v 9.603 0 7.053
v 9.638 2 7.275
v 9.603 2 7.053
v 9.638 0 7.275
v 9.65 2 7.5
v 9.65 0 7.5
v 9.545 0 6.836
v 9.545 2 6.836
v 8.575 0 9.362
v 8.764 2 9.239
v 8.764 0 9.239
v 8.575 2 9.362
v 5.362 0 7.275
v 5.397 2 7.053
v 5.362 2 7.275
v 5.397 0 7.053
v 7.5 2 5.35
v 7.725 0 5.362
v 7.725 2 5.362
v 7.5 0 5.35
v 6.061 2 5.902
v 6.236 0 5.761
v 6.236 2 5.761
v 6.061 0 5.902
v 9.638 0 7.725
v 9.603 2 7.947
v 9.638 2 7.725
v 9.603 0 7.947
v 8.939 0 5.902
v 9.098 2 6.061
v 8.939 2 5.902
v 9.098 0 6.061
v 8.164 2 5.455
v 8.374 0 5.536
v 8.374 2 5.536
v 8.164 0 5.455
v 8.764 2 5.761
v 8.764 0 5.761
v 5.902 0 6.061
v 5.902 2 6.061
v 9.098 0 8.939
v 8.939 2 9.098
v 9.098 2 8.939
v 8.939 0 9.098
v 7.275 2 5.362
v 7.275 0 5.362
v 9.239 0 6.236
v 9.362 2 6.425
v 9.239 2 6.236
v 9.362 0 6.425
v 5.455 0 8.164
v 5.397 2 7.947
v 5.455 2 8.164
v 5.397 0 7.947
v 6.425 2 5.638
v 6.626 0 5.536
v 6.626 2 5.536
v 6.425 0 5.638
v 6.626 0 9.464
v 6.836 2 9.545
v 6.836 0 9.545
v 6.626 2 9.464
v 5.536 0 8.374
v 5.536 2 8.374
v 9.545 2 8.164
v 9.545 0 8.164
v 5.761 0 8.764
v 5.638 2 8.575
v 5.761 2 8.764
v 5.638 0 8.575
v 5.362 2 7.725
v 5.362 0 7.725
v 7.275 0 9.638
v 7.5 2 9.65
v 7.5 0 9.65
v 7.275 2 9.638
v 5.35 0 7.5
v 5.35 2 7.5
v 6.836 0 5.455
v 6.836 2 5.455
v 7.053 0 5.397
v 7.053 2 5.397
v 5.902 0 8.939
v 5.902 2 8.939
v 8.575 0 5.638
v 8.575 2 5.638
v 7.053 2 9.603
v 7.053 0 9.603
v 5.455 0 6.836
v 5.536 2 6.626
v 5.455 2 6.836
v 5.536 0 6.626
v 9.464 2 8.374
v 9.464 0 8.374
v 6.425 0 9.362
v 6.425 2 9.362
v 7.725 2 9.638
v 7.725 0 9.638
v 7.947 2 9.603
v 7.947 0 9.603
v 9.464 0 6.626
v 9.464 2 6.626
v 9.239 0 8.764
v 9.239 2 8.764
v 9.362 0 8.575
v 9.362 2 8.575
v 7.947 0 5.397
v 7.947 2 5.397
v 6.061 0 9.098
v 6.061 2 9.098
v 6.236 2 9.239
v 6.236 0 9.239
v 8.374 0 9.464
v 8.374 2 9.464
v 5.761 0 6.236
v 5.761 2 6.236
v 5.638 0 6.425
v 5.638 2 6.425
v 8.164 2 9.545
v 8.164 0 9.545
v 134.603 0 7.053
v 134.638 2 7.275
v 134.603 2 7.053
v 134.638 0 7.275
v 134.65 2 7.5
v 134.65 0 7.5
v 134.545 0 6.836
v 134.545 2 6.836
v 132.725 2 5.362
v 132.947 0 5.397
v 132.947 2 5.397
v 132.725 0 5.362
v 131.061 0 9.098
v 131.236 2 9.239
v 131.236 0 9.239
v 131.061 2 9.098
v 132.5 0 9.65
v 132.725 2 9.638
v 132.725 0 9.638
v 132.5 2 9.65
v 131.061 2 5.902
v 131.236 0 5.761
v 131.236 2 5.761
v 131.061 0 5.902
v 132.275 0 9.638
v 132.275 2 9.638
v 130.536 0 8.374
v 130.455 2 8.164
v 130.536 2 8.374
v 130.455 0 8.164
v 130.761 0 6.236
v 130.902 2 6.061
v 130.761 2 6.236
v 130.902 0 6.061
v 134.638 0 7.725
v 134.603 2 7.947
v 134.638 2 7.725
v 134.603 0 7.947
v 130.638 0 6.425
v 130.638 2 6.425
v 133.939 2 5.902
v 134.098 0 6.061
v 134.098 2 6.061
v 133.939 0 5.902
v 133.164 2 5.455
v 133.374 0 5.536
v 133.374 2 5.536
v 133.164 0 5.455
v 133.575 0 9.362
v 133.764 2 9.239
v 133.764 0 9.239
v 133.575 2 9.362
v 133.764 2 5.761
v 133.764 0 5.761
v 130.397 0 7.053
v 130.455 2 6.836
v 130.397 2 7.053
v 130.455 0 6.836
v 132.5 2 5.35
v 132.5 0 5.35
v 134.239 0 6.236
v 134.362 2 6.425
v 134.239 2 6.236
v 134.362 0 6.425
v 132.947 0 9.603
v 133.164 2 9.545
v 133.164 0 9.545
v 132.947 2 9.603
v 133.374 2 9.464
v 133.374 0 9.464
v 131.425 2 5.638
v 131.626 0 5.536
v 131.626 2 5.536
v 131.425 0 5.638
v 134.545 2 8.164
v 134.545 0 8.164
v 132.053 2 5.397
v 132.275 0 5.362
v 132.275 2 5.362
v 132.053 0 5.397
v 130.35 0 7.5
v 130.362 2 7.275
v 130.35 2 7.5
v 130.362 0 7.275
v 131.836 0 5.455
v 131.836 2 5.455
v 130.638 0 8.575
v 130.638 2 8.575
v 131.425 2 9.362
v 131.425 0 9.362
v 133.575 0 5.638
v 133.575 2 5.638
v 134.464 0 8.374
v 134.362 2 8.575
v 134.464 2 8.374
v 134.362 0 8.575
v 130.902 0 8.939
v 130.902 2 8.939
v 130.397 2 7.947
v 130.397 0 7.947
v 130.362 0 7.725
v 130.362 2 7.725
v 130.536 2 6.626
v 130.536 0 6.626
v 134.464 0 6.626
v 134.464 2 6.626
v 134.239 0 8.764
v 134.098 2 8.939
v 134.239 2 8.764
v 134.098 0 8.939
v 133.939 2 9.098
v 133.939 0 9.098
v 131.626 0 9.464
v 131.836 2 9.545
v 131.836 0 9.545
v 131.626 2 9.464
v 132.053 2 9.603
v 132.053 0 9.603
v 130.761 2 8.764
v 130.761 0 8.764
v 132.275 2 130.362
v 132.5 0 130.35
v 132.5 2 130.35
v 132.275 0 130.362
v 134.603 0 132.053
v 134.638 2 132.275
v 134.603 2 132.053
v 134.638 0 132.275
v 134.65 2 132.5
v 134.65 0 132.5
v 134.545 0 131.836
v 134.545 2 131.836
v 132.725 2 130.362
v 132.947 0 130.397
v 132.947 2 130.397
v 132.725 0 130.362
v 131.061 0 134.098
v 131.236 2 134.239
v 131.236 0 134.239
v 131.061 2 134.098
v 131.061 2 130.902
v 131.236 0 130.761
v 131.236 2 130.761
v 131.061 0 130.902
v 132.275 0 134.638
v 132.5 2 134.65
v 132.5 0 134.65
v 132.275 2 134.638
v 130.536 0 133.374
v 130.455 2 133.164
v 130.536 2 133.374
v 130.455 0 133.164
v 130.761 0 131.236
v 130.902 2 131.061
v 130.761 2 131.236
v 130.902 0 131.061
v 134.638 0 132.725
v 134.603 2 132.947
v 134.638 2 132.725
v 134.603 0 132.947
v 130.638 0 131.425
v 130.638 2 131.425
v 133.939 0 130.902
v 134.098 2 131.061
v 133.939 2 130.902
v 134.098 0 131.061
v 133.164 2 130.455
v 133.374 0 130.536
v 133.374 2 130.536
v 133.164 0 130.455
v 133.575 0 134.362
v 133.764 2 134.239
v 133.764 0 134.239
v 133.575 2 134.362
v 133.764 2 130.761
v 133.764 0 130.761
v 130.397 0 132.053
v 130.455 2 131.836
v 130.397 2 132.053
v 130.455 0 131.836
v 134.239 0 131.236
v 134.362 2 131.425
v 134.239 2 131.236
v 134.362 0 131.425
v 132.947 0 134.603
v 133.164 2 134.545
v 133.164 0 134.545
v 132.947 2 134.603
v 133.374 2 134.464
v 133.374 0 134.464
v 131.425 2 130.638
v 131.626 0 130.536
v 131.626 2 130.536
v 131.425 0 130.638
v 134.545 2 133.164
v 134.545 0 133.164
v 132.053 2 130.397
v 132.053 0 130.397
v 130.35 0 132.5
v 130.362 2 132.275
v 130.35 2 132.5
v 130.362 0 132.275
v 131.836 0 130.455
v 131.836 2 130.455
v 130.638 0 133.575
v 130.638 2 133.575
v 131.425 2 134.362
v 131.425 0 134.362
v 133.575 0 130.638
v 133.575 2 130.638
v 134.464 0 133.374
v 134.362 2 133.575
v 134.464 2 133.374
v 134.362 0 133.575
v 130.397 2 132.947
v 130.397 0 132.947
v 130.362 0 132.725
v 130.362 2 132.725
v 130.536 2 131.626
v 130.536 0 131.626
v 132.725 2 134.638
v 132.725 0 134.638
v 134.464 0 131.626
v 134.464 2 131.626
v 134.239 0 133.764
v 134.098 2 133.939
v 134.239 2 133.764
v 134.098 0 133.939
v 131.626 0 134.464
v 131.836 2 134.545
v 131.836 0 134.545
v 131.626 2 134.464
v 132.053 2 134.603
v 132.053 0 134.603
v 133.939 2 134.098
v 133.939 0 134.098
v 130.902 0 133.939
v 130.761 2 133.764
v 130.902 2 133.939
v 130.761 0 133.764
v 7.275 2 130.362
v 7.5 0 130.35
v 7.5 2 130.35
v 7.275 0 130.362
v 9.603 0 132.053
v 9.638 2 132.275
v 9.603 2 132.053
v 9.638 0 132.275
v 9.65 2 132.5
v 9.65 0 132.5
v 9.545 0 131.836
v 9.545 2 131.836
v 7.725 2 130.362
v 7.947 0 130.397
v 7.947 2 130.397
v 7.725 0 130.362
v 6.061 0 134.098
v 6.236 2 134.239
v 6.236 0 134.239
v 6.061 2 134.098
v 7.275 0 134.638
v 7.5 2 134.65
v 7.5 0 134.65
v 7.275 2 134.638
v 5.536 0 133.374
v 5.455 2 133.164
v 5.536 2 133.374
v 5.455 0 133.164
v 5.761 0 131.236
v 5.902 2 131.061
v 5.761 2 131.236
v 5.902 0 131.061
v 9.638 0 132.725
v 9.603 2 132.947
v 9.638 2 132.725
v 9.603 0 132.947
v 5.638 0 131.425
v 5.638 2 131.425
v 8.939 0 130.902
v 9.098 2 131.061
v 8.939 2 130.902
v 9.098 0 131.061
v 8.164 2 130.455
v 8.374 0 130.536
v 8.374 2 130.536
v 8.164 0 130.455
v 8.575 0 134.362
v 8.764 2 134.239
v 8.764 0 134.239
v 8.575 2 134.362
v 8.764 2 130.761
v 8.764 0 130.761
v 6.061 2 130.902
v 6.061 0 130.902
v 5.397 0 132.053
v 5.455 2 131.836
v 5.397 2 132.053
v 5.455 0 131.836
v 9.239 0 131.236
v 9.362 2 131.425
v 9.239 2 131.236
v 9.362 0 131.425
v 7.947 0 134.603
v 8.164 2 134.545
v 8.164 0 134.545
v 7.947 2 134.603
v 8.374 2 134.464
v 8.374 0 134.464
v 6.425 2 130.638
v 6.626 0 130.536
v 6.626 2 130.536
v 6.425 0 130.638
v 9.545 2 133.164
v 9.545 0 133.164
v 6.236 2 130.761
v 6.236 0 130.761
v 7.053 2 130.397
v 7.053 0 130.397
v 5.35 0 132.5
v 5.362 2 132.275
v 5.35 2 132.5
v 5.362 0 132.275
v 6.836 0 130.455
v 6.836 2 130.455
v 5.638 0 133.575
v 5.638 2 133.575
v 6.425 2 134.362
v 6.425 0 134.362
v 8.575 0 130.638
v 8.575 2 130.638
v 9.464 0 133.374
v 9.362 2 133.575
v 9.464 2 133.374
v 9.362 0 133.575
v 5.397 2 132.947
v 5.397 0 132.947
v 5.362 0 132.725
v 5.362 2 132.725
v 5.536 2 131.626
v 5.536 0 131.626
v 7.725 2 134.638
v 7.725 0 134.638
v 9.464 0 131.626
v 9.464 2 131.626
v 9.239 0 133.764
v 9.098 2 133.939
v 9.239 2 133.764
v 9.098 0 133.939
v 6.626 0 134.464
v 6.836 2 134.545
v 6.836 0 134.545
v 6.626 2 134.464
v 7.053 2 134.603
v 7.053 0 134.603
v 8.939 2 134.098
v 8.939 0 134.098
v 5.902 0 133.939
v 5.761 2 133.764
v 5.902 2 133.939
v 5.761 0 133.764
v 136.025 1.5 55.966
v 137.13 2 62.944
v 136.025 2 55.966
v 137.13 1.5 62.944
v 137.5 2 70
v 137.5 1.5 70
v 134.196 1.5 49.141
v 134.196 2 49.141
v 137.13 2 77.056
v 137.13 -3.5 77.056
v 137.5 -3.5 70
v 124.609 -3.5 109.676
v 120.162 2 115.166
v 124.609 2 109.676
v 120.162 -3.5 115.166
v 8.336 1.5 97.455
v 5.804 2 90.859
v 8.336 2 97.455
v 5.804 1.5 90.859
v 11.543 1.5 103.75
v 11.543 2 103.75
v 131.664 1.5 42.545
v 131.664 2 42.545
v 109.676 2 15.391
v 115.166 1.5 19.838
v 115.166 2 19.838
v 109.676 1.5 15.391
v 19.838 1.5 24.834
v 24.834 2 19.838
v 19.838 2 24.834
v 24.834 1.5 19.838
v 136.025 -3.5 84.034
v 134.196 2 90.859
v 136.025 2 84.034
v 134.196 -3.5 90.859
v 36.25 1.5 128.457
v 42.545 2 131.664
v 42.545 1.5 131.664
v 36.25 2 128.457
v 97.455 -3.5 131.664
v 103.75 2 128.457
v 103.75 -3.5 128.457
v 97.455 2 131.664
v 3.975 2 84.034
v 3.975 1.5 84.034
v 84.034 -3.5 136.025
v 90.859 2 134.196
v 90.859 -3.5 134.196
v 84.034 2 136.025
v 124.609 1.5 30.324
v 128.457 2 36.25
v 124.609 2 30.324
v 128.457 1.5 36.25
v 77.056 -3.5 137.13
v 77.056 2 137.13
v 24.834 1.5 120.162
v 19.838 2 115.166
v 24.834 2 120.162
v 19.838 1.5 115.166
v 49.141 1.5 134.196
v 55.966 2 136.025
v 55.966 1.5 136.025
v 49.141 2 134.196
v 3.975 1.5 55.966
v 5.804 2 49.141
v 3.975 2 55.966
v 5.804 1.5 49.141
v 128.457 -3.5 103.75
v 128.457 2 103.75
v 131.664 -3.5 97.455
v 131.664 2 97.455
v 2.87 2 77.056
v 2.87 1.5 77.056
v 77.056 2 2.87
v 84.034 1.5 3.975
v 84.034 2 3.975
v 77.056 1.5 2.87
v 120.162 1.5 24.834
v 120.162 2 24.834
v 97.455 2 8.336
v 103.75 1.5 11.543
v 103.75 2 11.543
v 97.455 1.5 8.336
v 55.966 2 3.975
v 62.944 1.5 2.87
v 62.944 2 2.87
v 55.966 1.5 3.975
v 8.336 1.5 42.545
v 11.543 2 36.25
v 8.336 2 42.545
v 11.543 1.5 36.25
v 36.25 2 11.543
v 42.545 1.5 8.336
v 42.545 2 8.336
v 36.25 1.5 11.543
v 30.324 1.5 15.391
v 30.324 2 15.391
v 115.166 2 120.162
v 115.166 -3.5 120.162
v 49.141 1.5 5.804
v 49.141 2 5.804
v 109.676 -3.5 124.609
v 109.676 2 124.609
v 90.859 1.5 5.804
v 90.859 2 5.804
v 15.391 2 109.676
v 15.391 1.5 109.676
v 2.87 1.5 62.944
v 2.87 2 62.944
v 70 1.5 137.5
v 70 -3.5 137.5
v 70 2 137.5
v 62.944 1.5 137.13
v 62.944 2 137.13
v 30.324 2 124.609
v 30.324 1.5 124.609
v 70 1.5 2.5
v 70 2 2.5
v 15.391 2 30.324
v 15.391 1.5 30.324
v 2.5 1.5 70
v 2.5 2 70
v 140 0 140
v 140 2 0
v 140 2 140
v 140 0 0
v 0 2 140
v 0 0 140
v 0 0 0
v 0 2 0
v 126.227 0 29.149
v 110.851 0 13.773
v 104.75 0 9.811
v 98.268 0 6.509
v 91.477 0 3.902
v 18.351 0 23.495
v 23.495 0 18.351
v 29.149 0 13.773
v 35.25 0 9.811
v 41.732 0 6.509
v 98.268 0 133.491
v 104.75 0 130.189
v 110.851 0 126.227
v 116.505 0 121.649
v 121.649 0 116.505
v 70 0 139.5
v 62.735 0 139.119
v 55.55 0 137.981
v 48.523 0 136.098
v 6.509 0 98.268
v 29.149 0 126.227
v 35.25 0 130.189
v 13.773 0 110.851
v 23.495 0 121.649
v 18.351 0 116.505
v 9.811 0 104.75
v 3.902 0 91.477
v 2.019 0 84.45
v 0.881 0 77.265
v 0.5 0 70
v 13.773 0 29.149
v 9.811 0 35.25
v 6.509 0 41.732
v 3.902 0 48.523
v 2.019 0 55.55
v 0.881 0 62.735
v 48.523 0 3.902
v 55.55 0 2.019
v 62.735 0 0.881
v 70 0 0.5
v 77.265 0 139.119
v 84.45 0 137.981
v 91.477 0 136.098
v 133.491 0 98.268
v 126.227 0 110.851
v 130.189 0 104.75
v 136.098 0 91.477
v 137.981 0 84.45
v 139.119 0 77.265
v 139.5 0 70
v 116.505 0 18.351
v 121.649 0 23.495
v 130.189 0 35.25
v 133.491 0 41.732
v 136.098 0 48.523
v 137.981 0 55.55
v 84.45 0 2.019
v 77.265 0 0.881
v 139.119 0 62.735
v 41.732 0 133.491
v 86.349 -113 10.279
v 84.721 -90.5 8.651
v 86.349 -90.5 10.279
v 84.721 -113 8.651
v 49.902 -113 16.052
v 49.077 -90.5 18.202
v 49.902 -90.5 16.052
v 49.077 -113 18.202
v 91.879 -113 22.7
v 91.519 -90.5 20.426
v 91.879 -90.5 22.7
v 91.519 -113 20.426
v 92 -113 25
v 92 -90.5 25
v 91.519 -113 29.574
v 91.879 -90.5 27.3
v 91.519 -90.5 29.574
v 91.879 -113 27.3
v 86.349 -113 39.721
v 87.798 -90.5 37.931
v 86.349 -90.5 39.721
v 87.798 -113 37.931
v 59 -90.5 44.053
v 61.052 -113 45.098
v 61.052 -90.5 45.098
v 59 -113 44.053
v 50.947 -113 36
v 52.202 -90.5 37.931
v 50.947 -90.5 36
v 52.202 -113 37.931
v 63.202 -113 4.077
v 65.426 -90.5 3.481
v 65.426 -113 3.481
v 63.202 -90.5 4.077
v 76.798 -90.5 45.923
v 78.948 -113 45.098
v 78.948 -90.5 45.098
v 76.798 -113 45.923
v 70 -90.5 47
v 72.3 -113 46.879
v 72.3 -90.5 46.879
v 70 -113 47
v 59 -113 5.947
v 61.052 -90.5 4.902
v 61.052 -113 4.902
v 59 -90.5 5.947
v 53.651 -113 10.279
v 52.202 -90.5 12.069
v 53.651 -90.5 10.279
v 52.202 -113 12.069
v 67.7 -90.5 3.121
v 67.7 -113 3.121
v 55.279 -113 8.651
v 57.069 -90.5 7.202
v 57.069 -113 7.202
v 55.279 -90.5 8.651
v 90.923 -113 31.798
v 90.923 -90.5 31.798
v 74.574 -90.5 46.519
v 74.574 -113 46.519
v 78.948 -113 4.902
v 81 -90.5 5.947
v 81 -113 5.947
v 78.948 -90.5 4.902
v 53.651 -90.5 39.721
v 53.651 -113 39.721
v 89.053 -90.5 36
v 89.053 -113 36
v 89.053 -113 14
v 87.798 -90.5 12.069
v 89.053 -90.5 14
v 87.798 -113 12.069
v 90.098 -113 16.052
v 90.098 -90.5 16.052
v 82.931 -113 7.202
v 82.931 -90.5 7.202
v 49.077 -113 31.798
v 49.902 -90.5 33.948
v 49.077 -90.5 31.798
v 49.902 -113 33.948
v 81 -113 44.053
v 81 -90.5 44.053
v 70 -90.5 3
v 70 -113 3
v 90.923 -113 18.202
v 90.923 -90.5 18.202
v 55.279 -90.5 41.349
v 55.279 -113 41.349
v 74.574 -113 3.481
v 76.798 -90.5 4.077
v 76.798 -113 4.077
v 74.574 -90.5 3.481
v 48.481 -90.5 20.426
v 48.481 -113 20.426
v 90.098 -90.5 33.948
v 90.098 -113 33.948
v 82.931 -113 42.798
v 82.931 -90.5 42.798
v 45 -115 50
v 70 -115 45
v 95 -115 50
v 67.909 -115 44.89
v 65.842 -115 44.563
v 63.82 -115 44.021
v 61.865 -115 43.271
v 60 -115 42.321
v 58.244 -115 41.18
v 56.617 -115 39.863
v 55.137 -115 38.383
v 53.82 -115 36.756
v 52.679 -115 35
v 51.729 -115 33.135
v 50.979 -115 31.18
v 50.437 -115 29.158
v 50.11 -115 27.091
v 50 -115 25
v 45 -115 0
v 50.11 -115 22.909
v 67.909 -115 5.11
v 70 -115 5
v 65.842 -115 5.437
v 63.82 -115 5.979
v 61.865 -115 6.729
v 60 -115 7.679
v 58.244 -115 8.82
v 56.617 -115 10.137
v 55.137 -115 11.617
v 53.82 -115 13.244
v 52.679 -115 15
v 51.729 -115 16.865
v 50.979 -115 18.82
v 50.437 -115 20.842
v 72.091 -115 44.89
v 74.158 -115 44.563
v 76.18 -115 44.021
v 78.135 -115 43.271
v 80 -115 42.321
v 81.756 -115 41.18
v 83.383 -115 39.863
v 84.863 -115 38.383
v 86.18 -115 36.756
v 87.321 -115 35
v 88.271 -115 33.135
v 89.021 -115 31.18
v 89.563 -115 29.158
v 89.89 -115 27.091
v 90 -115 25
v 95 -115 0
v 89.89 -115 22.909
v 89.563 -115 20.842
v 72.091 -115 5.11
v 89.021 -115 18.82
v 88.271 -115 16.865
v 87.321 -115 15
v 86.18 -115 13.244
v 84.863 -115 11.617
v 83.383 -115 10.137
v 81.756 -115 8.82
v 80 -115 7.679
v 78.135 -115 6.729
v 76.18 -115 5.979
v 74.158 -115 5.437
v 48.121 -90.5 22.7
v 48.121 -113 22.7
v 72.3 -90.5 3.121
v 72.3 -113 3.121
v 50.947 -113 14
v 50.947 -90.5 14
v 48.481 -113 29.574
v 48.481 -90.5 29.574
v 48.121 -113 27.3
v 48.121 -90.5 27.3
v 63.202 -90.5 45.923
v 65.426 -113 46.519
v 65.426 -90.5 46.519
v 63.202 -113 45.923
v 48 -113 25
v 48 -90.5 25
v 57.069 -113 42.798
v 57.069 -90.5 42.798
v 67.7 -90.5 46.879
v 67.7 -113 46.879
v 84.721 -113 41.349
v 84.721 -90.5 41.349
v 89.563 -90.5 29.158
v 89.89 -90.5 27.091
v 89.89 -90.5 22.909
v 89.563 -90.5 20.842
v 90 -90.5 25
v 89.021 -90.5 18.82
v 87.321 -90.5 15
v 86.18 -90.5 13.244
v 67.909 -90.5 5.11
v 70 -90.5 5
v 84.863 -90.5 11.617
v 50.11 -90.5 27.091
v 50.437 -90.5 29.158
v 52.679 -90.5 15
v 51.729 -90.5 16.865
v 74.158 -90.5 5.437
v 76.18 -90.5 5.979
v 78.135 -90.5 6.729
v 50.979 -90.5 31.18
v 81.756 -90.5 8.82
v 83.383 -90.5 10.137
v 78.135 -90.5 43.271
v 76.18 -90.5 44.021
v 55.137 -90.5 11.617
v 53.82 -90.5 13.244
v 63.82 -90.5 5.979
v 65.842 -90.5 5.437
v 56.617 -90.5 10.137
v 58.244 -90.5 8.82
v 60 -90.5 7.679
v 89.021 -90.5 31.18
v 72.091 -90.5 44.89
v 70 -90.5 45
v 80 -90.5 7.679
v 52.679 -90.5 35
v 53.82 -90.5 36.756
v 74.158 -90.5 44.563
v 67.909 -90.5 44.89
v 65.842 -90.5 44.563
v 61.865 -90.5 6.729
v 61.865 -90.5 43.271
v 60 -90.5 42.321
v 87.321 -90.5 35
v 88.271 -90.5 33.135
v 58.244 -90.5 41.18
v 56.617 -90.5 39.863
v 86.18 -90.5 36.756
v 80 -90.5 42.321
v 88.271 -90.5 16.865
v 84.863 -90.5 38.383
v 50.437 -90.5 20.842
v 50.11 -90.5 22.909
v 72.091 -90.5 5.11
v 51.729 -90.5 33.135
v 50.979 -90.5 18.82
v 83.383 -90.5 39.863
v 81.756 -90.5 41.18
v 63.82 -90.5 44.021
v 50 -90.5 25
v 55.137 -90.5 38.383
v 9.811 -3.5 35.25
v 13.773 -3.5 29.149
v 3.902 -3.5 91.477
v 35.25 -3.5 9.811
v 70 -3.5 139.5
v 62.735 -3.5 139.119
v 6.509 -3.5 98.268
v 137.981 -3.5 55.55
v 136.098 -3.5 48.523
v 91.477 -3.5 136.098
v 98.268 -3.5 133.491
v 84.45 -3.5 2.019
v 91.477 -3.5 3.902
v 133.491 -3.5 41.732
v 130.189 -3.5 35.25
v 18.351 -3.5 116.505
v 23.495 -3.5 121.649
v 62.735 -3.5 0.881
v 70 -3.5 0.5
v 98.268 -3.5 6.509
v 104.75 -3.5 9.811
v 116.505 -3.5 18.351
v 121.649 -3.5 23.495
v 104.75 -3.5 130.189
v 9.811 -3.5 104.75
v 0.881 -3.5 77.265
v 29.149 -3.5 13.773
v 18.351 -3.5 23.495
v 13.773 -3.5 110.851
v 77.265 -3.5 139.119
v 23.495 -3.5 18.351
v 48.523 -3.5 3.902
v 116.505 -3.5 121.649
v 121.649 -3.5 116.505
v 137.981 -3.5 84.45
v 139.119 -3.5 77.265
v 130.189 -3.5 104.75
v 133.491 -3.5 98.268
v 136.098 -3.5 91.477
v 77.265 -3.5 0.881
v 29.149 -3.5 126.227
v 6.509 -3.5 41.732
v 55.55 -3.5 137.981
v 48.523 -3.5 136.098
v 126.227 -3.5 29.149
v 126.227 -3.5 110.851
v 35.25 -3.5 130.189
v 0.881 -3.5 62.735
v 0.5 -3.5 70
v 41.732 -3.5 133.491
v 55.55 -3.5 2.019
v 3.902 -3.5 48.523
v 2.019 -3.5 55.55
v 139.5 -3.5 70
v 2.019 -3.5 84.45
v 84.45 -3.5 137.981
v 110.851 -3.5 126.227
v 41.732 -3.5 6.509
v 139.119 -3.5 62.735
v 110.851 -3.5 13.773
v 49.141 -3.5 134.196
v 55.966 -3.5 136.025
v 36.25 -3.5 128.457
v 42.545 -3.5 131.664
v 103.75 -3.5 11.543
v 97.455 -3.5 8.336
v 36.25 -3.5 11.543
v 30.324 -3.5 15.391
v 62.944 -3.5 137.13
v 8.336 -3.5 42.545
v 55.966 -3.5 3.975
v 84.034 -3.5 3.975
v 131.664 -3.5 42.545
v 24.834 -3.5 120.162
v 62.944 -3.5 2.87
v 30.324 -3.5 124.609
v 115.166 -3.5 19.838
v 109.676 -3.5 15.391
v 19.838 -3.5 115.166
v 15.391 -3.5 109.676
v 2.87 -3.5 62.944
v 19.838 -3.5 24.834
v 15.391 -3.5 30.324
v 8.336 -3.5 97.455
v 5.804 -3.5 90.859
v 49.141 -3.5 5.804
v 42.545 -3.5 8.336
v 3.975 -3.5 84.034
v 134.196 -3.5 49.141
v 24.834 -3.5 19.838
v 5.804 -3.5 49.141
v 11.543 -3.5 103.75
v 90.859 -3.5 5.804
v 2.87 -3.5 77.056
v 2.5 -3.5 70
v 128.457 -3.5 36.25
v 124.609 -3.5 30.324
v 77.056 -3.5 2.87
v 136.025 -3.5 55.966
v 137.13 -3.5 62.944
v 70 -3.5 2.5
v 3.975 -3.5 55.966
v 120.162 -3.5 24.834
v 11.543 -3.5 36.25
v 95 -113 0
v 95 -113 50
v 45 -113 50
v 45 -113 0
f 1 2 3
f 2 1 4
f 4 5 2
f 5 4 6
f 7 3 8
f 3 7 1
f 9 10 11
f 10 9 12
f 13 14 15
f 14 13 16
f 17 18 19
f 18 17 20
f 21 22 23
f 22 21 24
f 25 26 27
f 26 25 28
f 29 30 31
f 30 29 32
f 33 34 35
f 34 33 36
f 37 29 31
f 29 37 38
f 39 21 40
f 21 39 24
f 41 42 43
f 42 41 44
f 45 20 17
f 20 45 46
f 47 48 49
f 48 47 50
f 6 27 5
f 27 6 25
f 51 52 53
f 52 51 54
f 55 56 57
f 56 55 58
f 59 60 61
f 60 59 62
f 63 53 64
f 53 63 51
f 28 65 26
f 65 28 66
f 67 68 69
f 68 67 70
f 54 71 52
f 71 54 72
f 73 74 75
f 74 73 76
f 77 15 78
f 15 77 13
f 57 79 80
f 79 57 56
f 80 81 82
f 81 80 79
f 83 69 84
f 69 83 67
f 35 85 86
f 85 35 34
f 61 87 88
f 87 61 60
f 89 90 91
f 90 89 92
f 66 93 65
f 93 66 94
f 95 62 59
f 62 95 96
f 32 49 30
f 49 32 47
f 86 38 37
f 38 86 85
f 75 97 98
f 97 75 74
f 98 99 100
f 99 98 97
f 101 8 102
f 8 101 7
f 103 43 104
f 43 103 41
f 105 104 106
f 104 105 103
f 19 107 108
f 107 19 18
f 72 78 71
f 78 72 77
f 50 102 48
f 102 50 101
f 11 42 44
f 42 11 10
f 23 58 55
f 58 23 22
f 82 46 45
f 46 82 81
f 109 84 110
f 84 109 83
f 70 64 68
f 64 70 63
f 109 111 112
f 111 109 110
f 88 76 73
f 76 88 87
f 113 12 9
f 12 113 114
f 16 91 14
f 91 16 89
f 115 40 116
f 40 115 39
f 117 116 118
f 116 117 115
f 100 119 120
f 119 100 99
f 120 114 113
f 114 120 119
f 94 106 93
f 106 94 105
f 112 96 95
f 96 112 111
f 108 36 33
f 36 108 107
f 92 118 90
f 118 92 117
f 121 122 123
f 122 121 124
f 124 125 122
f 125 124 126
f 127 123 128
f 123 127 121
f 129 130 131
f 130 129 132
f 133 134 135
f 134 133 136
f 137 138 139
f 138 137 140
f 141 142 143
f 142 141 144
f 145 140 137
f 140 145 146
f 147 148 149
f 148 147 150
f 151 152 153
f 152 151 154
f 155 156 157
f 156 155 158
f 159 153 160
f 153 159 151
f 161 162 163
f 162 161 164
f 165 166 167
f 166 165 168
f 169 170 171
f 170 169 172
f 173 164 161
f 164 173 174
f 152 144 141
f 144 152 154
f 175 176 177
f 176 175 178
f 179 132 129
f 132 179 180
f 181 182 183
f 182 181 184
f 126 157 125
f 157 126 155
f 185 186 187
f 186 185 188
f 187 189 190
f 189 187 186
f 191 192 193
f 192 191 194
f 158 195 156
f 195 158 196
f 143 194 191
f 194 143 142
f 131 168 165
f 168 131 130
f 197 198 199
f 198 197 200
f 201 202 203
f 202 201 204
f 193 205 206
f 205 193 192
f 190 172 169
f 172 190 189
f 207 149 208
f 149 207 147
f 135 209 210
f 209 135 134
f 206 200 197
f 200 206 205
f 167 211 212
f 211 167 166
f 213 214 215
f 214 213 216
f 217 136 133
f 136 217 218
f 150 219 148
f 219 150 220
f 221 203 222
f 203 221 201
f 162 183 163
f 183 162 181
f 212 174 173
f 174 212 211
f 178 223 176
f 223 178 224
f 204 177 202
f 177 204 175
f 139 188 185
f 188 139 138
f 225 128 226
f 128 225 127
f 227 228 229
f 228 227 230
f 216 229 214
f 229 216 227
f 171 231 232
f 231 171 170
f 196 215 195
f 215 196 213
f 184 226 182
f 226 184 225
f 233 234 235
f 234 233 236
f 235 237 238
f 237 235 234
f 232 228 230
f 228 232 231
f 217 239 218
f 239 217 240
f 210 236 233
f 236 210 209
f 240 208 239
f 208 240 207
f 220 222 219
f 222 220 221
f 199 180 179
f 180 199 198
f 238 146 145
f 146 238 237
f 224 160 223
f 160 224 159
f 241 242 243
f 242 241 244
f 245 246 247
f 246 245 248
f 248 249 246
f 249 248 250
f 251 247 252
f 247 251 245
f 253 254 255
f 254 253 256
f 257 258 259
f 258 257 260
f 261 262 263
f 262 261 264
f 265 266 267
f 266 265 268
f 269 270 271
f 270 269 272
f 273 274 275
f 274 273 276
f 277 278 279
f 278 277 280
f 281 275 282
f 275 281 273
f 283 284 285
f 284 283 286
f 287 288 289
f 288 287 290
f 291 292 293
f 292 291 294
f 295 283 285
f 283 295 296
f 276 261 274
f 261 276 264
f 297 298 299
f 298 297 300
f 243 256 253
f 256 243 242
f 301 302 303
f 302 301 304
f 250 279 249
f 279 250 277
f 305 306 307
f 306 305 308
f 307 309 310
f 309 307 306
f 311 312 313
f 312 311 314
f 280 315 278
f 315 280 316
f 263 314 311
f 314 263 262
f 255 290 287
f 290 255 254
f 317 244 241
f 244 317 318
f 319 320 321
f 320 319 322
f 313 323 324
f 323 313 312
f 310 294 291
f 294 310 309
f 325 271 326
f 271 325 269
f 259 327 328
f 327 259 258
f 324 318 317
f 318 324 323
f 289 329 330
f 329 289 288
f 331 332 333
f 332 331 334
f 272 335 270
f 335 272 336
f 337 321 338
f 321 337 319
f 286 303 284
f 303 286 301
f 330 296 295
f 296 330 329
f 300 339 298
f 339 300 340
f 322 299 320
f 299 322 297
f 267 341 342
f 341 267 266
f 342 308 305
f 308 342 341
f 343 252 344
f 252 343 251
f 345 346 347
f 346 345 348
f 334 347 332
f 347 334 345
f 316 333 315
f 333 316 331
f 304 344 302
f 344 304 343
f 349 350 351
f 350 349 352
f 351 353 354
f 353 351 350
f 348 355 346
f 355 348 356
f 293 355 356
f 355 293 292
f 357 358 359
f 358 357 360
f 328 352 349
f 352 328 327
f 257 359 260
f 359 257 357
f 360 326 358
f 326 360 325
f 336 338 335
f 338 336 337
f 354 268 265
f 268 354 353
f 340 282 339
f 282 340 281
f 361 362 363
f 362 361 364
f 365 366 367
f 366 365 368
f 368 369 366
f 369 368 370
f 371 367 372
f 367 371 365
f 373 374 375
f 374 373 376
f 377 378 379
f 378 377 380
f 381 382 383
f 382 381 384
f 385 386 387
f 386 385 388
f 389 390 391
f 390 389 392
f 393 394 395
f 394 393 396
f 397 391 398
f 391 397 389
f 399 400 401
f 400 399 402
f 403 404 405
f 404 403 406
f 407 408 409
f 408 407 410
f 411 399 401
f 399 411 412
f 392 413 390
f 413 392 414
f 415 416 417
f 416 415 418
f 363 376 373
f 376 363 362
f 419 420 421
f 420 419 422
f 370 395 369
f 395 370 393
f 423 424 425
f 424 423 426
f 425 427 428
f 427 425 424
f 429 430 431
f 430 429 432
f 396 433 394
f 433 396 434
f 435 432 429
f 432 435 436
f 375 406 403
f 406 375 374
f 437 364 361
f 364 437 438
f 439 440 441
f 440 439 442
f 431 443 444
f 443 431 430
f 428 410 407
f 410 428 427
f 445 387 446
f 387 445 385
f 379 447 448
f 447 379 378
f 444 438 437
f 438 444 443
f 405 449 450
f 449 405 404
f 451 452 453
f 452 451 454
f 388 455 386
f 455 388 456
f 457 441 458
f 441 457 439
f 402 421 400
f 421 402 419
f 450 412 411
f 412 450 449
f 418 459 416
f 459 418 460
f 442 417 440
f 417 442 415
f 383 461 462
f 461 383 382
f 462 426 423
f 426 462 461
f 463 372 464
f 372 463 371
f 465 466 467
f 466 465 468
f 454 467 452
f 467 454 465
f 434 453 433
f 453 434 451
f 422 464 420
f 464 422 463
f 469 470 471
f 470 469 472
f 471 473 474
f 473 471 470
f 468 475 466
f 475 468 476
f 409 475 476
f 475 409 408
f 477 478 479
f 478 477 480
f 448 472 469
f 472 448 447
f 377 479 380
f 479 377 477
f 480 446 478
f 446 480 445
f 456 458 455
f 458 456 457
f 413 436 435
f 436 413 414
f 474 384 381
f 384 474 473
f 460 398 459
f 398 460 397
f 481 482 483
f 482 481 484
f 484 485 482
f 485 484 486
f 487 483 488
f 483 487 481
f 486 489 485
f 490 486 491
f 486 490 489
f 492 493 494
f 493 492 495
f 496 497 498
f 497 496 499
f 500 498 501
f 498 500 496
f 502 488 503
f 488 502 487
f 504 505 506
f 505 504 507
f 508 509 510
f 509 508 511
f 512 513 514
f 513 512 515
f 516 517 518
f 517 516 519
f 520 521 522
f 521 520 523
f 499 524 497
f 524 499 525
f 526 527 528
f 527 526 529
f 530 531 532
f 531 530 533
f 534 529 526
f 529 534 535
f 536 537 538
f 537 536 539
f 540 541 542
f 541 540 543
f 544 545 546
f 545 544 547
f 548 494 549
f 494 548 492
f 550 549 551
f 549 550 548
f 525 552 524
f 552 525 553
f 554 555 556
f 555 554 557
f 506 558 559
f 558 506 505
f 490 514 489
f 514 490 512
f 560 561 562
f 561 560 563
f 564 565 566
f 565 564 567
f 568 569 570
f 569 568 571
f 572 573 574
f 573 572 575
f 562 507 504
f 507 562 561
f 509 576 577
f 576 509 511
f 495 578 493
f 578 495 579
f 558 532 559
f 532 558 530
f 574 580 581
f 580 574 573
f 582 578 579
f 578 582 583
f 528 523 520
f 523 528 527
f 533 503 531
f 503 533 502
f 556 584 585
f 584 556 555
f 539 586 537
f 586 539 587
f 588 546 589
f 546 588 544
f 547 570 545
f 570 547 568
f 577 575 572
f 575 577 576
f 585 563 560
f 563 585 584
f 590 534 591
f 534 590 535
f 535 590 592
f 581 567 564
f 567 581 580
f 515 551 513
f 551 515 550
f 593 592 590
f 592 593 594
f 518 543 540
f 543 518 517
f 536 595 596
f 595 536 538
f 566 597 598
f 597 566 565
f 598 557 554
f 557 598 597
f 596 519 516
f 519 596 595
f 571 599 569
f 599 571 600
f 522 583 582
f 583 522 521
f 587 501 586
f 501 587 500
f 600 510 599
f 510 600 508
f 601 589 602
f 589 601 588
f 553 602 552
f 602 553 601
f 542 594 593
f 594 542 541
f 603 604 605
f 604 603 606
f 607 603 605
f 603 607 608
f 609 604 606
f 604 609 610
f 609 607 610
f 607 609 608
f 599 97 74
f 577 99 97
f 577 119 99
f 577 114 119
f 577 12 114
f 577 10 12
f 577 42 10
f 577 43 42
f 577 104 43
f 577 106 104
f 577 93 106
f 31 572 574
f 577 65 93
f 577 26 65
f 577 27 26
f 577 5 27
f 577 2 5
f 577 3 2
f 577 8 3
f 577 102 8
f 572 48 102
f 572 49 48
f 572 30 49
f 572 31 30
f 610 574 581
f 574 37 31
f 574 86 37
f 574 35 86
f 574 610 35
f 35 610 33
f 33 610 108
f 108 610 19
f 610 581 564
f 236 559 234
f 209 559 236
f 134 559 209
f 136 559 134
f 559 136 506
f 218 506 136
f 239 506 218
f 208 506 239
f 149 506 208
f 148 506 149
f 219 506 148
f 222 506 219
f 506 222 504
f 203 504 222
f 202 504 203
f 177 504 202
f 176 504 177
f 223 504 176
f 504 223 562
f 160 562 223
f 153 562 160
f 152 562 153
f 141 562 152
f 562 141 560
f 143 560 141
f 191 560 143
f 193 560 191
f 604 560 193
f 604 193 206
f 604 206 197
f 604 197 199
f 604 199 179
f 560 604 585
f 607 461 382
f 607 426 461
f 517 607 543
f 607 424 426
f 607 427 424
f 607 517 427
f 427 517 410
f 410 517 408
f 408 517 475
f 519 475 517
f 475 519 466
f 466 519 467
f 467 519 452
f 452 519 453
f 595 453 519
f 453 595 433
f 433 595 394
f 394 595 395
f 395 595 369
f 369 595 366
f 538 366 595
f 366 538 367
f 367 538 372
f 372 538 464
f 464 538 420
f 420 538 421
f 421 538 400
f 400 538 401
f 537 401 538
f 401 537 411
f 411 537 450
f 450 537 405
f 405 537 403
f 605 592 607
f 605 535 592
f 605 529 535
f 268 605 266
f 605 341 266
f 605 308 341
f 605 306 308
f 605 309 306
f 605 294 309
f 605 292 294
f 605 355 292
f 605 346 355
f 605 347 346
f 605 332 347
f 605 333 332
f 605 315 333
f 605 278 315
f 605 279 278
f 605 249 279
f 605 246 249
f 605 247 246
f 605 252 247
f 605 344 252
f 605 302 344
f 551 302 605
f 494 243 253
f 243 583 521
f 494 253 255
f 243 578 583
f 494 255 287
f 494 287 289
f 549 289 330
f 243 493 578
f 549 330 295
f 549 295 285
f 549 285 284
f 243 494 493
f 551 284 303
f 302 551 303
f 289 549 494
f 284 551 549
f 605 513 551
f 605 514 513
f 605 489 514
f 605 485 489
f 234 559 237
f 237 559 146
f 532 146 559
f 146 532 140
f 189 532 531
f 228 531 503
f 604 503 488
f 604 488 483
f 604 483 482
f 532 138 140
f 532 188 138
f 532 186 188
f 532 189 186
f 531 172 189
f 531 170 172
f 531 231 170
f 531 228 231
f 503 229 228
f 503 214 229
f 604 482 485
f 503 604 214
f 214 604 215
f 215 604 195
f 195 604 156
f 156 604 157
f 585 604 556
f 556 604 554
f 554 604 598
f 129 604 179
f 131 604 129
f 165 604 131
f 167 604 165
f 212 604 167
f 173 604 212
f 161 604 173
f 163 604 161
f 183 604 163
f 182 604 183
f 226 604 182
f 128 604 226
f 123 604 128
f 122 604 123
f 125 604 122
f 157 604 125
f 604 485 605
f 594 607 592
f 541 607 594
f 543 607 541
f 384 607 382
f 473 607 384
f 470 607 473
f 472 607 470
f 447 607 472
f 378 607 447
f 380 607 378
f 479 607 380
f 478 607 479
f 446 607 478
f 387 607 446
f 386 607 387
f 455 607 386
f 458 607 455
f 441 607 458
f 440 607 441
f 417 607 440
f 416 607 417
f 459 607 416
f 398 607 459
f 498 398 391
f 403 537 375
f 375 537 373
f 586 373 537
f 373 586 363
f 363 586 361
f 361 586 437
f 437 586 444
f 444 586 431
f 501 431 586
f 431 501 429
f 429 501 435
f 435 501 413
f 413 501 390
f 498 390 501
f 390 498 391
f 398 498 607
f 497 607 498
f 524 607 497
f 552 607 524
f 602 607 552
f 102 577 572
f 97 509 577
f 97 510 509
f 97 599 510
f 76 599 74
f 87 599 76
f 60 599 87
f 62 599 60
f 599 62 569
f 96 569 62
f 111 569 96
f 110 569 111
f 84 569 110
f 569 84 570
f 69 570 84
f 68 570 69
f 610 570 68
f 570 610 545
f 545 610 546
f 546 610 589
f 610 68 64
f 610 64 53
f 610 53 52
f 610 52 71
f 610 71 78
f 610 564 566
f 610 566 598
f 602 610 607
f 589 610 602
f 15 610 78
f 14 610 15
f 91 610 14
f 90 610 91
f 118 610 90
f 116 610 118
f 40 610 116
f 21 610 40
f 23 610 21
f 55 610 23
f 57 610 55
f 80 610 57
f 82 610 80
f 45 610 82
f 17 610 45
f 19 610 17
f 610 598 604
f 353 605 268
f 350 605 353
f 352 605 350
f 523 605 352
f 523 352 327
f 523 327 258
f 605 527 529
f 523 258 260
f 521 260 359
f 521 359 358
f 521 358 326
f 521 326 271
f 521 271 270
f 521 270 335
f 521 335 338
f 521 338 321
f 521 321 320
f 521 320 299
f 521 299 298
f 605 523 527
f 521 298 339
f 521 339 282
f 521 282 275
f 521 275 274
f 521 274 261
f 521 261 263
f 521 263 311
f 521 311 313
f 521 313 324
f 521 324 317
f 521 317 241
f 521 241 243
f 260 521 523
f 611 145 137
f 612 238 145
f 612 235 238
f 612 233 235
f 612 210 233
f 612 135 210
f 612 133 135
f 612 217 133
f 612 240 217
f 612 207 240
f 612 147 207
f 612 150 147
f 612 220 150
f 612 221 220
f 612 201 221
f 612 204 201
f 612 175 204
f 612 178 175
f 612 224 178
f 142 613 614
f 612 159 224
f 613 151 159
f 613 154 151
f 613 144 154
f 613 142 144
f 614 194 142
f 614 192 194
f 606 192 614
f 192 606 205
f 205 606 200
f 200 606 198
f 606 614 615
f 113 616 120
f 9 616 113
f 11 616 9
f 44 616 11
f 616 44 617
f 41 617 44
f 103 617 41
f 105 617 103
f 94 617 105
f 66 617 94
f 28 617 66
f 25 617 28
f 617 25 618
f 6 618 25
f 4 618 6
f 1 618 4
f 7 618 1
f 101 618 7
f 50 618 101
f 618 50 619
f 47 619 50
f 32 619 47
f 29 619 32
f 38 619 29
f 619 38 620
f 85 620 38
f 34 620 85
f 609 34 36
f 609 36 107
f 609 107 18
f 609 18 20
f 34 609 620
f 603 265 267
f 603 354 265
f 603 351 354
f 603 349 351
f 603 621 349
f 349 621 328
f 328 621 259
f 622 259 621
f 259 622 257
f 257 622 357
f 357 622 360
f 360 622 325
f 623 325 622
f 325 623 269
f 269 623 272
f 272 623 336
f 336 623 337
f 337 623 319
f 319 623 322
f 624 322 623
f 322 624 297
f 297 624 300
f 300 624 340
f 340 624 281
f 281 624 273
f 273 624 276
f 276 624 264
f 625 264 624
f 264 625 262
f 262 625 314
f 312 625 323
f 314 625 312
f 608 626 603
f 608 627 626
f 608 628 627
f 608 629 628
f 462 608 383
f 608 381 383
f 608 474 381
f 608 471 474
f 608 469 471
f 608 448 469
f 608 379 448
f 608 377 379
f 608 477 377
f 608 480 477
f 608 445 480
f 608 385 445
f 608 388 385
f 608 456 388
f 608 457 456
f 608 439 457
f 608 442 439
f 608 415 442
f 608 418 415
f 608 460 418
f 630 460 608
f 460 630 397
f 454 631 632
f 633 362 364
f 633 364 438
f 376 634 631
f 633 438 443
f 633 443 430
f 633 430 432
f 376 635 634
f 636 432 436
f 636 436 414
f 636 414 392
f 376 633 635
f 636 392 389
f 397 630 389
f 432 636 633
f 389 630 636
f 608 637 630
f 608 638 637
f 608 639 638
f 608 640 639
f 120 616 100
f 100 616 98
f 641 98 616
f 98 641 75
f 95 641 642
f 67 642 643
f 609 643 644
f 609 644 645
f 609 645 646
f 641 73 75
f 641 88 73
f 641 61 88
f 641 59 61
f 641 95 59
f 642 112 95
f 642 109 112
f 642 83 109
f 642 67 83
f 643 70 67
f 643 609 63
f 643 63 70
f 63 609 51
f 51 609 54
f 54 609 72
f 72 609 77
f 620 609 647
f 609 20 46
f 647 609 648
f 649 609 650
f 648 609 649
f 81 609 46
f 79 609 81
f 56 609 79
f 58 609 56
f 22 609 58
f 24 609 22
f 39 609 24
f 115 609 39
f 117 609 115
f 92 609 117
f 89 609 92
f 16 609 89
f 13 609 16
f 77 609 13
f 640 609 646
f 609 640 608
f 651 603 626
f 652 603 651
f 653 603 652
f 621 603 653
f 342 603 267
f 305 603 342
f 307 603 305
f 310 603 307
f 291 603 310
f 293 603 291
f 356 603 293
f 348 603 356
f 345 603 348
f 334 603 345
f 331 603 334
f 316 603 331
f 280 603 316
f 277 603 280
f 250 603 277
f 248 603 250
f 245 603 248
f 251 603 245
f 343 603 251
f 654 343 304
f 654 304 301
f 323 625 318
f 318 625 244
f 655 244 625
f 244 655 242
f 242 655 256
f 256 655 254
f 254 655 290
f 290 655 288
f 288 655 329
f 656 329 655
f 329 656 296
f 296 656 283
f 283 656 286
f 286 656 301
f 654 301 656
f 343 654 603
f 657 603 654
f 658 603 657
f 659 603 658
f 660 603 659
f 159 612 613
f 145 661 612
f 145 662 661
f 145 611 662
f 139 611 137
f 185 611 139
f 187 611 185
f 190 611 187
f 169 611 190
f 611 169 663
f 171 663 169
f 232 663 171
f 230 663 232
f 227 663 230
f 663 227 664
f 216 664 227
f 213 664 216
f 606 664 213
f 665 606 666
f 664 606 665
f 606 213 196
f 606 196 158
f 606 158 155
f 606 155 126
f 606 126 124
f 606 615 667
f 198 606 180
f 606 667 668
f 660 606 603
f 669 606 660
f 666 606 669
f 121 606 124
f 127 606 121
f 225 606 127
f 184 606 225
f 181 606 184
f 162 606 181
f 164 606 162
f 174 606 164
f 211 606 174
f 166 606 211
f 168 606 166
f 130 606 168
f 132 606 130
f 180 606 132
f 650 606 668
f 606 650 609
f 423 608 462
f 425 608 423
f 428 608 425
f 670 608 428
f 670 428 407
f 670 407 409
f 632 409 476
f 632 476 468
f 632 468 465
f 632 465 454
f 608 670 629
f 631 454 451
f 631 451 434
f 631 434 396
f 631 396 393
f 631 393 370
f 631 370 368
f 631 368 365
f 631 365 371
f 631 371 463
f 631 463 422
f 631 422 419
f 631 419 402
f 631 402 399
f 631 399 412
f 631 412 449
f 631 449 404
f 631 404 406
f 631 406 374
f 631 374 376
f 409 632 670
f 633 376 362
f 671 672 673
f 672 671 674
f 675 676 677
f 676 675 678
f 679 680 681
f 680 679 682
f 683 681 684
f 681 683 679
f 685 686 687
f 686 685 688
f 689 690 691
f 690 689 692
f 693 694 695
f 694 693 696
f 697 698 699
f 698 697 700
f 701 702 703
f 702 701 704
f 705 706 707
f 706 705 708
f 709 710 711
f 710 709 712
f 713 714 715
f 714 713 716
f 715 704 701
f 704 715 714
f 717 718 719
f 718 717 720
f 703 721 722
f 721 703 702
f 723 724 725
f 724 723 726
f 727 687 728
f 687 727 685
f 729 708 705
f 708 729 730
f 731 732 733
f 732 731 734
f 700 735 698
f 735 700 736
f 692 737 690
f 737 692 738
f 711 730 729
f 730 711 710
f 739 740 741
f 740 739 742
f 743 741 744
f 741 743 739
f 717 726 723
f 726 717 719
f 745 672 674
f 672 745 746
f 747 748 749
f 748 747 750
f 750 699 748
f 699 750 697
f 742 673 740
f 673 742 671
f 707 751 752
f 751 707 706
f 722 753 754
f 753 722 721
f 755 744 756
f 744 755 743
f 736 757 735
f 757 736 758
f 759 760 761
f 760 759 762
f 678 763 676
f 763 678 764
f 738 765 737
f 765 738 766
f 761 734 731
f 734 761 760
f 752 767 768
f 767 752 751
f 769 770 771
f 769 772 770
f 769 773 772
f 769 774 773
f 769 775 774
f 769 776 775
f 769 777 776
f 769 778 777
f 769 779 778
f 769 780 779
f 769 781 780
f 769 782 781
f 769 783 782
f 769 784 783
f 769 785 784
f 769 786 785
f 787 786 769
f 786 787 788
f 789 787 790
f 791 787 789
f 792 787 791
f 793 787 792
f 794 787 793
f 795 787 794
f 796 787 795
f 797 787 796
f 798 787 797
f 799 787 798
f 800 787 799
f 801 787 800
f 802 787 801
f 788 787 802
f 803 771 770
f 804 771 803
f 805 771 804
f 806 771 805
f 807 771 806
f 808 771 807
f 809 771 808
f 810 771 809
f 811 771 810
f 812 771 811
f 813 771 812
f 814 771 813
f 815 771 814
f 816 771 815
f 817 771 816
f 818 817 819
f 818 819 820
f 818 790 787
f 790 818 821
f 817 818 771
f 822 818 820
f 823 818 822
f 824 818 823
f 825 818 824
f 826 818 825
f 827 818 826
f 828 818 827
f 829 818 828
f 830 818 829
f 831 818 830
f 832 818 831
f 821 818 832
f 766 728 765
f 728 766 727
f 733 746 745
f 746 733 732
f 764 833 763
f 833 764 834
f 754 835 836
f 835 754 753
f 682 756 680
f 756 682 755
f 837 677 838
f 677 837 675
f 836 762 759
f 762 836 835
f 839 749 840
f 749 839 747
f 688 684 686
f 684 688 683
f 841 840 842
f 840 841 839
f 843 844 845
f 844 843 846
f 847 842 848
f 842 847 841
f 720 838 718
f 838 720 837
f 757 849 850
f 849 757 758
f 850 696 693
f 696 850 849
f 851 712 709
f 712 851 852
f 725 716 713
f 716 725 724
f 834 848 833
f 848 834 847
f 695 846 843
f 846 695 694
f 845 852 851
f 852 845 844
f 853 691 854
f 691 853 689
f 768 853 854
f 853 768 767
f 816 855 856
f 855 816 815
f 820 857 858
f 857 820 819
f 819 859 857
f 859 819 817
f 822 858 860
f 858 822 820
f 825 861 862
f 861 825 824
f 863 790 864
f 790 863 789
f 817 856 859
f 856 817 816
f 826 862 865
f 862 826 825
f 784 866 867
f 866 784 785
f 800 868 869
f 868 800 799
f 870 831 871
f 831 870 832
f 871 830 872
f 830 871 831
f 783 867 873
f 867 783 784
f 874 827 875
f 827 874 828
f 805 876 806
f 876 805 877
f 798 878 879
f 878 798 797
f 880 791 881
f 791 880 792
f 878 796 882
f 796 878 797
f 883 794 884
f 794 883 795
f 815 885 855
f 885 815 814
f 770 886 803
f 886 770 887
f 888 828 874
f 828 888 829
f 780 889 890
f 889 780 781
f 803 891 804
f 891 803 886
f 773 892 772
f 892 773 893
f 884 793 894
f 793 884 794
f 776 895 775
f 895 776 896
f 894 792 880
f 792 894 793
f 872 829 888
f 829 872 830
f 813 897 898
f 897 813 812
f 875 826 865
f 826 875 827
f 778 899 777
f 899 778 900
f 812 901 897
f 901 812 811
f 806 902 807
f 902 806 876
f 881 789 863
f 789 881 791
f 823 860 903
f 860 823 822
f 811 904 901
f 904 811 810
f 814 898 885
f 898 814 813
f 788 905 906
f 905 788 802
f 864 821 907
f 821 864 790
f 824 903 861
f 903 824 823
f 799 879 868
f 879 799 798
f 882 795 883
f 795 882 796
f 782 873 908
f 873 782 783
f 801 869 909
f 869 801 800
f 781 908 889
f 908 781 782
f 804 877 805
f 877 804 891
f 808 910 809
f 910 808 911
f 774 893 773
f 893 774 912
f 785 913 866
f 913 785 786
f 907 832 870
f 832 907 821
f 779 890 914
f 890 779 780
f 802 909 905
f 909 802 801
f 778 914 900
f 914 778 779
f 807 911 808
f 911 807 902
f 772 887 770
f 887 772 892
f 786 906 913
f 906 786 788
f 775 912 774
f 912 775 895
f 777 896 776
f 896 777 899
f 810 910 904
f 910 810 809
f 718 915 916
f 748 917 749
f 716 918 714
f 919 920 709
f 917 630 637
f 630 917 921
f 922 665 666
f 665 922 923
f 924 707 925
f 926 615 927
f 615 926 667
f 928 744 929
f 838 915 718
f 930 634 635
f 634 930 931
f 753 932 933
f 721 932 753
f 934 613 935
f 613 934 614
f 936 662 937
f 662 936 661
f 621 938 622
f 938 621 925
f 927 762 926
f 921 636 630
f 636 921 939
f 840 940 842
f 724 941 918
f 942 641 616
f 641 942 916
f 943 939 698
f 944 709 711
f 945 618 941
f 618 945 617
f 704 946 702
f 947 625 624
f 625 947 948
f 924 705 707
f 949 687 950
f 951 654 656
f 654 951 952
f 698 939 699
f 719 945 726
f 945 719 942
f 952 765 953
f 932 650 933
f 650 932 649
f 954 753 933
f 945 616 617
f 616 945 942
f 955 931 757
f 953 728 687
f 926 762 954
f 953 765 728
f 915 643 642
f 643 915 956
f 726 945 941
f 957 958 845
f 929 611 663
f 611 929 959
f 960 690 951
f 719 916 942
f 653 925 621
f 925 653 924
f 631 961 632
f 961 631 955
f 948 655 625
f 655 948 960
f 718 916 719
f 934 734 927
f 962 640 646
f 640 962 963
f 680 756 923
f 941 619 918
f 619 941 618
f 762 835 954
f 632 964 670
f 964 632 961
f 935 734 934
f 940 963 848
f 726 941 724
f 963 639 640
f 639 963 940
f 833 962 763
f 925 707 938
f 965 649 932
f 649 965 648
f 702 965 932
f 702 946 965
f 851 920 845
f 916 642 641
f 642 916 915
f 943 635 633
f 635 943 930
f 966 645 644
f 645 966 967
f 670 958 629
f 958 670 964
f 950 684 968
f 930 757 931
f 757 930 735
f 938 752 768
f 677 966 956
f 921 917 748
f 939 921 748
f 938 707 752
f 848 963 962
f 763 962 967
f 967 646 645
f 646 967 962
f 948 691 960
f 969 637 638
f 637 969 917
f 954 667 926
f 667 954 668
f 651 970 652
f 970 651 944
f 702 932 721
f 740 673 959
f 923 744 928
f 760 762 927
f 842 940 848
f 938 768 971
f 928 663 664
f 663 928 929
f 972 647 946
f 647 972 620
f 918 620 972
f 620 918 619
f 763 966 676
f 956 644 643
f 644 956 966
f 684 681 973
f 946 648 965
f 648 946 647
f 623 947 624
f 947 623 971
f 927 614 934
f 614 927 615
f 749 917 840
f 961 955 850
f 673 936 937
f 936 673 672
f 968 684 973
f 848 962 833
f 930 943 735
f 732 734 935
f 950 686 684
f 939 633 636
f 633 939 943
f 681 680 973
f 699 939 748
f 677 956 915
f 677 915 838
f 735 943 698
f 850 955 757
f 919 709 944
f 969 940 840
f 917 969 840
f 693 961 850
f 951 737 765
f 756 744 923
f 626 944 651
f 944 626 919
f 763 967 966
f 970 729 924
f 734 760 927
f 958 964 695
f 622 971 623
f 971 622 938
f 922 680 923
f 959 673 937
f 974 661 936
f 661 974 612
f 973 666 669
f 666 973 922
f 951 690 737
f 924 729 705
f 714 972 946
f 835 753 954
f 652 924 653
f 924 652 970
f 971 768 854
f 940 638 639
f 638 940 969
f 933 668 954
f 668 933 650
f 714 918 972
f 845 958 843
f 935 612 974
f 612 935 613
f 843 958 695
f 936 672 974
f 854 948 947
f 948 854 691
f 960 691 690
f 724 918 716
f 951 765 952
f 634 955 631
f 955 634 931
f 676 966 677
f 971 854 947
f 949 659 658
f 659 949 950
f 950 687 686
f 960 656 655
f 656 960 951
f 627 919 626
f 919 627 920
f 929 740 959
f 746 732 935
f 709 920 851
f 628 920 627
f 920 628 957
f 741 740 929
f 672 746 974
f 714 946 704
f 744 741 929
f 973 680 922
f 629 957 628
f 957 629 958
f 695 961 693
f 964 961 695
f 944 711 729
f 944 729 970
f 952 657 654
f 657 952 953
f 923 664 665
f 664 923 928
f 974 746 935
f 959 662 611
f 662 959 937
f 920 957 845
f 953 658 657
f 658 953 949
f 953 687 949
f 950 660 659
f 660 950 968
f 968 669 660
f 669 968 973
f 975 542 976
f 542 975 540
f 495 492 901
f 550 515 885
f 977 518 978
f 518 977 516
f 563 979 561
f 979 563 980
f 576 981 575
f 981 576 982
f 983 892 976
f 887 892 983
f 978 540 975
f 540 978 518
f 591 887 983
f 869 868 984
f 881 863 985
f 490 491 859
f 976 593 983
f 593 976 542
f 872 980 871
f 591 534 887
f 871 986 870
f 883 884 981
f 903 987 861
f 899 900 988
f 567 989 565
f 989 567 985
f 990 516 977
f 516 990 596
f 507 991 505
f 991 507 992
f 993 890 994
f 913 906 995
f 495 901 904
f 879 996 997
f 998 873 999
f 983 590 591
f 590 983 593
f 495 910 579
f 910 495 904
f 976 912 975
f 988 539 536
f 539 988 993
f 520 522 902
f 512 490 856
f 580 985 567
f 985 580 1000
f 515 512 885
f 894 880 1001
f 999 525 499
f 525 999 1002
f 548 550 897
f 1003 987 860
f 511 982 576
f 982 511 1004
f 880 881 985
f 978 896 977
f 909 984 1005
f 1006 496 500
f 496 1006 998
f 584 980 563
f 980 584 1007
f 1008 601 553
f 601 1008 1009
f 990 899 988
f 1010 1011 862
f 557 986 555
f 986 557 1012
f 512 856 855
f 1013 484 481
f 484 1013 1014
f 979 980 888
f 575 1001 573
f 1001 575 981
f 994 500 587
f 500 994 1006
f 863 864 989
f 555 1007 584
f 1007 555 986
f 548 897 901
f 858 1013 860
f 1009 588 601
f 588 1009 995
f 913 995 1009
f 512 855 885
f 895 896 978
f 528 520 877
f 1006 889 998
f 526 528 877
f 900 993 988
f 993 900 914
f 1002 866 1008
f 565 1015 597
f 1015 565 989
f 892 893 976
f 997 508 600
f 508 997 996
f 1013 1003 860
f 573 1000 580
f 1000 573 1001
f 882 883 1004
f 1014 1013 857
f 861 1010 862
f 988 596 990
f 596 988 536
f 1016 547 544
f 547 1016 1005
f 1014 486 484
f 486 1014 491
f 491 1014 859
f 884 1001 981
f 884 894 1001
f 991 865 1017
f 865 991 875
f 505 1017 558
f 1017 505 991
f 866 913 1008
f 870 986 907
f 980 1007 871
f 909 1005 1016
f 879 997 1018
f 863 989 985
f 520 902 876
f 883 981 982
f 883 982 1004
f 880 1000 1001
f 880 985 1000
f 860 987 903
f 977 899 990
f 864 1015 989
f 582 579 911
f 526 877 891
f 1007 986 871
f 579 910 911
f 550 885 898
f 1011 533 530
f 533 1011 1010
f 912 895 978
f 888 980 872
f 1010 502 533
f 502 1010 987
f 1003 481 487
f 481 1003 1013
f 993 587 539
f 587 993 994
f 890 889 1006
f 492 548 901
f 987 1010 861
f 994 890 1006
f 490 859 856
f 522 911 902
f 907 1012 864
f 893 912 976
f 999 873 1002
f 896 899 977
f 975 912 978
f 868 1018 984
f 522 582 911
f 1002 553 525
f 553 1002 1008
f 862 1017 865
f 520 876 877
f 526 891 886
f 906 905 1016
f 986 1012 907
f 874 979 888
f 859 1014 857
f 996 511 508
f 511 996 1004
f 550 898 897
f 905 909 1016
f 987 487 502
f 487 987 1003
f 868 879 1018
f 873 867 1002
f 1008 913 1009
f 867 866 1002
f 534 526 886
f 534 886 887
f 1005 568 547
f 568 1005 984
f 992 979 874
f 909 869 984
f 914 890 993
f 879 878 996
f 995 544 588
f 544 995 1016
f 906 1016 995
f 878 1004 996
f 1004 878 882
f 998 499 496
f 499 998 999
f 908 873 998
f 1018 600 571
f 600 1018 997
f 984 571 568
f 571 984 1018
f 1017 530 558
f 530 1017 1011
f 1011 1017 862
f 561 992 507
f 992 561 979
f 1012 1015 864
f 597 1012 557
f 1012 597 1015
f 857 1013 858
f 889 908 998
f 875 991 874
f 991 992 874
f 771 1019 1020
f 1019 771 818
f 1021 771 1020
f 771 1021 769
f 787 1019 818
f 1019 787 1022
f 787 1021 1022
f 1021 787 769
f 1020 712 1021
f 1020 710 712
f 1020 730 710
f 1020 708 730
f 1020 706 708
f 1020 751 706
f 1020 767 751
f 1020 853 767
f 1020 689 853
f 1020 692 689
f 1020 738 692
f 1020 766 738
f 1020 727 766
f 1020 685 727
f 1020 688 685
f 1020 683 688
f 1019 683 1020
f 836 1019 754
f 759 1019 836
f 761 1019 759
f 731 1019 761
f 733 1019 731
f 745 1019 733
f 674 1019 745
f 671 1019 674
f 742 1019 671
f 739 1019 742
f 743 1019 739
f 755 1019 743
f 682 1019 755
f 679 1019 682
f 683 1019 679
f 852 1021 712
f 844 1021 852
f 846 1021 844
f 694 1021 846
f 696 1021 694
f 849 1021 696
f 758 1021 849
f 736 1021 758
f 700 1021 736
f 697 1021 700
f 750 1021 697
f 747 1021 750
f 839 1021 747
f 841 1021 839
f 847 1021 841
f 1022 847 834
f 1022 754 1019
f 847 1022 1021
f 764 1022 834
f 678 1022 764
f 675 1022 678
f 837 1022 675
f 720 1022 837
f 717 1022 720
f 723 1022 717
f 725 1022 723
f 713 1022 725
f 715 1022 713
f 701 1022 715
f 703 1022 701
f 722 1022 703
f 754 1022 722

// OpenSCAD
$fn=60;


fan_l = 140;
fan_w = 25;
fan_r = (fan_l-5)/2;

pipe_r = 40/2;
pipe_conn = 50;

dist = 115;

fan_hole_dist = 7.5;

thread = 2.15;
flats=25;


module fanlike(){
    cube([fan_l, fan_w, fan_l]);
}

module screwHole(){
    rotate([-90,0,0]) cylinder(r=thread, h=15);
}

module pinLayout(){
    translate([fan_hole_dist, 0, fan_hole_dist]) {screwHole();}
    translate([fan_l-fan_hole_dist,0,fan_hole_dist]){screwHole();}
    translate([fan_l-fan_hole_dist,0,fan_l-fan_hole_dist]){screwHole();}
    translate([fan_hole_dist,0,fan_l-fan_hole_dist]){screwHole();}
}

module fanMount(){
    difference(){    
        cube([fan_l, 2, fan_l]);
        translate([0, -0.5, 0]) {//For z-fighting
            pinLayout();
            translate([fan_l/2, 0, fan_l/2]) {
                rotate([-90, 0, 0]) {
                    cylinder(r=fan_r, 10);
                    
                }
            }
        }
    }
   
        
}

module pipeThing(r1, r2){
    color([r1/255, r1/255, r1/255]) {
        
    hull(){
        translate([fan_l/2, -1, fan_l/2]) {
            rotate([-90,0,0])
                difference() {
                    cylinder(r=r1+2, h=5, center=true);
                    cylinder(r=r1, h=5+5, center=true);
                }
        }

        translate([fan_l/2 -pipe_conn/2, -dist+flats, 0]) {
            translate([pipe_conn/2, 0, pipe_conn/2]) {
                rotate([-90,0,0])
                difference() {
                    cylinder(r=r2+2, h=1, center=true);
                    cylinder(r=r2, h=1+5, center=true);
                }
            }
        }
    }
    }
    color([r2/255, r2/255, r2/255]) {

    translate([fan_l/2 -pipe_conn/2, -dist+flats/2, 0]) {
        translate([pipe_conn/2, 0, pipe_conn/2]) {
            rotate([-90,0,0])
            difference() {
                cylinder(r=r2+2, h=flats, center=true);
                cylinder(r=r2, h=flats+5, center=true);
            }
        }
    }
    }
}

module pipeConnector(){
    color([75/255, 255/255, 40/255]) {
        
    difference() {
        cube([pipe_conn, 2, pipe_conn]);
        translate([0, -0.5, 0]) {
            translate([pipe_conn/2, 0, pipe_conn/2]) {
                rotate([-90, 0, 0]) {
                    cylinder(r=pipe_r, h=15);
                }                
            }
            
        }
        
    }
    }

}





fanMount();
difference(){
    pipeThing(fan_r, pipe_r);
    pipeThing(fan_r-2, pipe_r-2);
}

//    translate([fan_l/2 -pipe_conn/2, -dist+flats/2, 0]) {
//         translate([pipe_conn/2, 0, pipe_conn/2]) {
//             rotate([-90,0,0])
//             difference() {
//                 cylinder(r=pipe_r+2, h=flats, center=true);
//                 cylinder(r=pipe_r, h=flats+5, center=true);
//             }
//         }
//     }
translate([fan_l/2 -pipe_conn/2, -dist, 0]) {
    pipeConnector();   
}
